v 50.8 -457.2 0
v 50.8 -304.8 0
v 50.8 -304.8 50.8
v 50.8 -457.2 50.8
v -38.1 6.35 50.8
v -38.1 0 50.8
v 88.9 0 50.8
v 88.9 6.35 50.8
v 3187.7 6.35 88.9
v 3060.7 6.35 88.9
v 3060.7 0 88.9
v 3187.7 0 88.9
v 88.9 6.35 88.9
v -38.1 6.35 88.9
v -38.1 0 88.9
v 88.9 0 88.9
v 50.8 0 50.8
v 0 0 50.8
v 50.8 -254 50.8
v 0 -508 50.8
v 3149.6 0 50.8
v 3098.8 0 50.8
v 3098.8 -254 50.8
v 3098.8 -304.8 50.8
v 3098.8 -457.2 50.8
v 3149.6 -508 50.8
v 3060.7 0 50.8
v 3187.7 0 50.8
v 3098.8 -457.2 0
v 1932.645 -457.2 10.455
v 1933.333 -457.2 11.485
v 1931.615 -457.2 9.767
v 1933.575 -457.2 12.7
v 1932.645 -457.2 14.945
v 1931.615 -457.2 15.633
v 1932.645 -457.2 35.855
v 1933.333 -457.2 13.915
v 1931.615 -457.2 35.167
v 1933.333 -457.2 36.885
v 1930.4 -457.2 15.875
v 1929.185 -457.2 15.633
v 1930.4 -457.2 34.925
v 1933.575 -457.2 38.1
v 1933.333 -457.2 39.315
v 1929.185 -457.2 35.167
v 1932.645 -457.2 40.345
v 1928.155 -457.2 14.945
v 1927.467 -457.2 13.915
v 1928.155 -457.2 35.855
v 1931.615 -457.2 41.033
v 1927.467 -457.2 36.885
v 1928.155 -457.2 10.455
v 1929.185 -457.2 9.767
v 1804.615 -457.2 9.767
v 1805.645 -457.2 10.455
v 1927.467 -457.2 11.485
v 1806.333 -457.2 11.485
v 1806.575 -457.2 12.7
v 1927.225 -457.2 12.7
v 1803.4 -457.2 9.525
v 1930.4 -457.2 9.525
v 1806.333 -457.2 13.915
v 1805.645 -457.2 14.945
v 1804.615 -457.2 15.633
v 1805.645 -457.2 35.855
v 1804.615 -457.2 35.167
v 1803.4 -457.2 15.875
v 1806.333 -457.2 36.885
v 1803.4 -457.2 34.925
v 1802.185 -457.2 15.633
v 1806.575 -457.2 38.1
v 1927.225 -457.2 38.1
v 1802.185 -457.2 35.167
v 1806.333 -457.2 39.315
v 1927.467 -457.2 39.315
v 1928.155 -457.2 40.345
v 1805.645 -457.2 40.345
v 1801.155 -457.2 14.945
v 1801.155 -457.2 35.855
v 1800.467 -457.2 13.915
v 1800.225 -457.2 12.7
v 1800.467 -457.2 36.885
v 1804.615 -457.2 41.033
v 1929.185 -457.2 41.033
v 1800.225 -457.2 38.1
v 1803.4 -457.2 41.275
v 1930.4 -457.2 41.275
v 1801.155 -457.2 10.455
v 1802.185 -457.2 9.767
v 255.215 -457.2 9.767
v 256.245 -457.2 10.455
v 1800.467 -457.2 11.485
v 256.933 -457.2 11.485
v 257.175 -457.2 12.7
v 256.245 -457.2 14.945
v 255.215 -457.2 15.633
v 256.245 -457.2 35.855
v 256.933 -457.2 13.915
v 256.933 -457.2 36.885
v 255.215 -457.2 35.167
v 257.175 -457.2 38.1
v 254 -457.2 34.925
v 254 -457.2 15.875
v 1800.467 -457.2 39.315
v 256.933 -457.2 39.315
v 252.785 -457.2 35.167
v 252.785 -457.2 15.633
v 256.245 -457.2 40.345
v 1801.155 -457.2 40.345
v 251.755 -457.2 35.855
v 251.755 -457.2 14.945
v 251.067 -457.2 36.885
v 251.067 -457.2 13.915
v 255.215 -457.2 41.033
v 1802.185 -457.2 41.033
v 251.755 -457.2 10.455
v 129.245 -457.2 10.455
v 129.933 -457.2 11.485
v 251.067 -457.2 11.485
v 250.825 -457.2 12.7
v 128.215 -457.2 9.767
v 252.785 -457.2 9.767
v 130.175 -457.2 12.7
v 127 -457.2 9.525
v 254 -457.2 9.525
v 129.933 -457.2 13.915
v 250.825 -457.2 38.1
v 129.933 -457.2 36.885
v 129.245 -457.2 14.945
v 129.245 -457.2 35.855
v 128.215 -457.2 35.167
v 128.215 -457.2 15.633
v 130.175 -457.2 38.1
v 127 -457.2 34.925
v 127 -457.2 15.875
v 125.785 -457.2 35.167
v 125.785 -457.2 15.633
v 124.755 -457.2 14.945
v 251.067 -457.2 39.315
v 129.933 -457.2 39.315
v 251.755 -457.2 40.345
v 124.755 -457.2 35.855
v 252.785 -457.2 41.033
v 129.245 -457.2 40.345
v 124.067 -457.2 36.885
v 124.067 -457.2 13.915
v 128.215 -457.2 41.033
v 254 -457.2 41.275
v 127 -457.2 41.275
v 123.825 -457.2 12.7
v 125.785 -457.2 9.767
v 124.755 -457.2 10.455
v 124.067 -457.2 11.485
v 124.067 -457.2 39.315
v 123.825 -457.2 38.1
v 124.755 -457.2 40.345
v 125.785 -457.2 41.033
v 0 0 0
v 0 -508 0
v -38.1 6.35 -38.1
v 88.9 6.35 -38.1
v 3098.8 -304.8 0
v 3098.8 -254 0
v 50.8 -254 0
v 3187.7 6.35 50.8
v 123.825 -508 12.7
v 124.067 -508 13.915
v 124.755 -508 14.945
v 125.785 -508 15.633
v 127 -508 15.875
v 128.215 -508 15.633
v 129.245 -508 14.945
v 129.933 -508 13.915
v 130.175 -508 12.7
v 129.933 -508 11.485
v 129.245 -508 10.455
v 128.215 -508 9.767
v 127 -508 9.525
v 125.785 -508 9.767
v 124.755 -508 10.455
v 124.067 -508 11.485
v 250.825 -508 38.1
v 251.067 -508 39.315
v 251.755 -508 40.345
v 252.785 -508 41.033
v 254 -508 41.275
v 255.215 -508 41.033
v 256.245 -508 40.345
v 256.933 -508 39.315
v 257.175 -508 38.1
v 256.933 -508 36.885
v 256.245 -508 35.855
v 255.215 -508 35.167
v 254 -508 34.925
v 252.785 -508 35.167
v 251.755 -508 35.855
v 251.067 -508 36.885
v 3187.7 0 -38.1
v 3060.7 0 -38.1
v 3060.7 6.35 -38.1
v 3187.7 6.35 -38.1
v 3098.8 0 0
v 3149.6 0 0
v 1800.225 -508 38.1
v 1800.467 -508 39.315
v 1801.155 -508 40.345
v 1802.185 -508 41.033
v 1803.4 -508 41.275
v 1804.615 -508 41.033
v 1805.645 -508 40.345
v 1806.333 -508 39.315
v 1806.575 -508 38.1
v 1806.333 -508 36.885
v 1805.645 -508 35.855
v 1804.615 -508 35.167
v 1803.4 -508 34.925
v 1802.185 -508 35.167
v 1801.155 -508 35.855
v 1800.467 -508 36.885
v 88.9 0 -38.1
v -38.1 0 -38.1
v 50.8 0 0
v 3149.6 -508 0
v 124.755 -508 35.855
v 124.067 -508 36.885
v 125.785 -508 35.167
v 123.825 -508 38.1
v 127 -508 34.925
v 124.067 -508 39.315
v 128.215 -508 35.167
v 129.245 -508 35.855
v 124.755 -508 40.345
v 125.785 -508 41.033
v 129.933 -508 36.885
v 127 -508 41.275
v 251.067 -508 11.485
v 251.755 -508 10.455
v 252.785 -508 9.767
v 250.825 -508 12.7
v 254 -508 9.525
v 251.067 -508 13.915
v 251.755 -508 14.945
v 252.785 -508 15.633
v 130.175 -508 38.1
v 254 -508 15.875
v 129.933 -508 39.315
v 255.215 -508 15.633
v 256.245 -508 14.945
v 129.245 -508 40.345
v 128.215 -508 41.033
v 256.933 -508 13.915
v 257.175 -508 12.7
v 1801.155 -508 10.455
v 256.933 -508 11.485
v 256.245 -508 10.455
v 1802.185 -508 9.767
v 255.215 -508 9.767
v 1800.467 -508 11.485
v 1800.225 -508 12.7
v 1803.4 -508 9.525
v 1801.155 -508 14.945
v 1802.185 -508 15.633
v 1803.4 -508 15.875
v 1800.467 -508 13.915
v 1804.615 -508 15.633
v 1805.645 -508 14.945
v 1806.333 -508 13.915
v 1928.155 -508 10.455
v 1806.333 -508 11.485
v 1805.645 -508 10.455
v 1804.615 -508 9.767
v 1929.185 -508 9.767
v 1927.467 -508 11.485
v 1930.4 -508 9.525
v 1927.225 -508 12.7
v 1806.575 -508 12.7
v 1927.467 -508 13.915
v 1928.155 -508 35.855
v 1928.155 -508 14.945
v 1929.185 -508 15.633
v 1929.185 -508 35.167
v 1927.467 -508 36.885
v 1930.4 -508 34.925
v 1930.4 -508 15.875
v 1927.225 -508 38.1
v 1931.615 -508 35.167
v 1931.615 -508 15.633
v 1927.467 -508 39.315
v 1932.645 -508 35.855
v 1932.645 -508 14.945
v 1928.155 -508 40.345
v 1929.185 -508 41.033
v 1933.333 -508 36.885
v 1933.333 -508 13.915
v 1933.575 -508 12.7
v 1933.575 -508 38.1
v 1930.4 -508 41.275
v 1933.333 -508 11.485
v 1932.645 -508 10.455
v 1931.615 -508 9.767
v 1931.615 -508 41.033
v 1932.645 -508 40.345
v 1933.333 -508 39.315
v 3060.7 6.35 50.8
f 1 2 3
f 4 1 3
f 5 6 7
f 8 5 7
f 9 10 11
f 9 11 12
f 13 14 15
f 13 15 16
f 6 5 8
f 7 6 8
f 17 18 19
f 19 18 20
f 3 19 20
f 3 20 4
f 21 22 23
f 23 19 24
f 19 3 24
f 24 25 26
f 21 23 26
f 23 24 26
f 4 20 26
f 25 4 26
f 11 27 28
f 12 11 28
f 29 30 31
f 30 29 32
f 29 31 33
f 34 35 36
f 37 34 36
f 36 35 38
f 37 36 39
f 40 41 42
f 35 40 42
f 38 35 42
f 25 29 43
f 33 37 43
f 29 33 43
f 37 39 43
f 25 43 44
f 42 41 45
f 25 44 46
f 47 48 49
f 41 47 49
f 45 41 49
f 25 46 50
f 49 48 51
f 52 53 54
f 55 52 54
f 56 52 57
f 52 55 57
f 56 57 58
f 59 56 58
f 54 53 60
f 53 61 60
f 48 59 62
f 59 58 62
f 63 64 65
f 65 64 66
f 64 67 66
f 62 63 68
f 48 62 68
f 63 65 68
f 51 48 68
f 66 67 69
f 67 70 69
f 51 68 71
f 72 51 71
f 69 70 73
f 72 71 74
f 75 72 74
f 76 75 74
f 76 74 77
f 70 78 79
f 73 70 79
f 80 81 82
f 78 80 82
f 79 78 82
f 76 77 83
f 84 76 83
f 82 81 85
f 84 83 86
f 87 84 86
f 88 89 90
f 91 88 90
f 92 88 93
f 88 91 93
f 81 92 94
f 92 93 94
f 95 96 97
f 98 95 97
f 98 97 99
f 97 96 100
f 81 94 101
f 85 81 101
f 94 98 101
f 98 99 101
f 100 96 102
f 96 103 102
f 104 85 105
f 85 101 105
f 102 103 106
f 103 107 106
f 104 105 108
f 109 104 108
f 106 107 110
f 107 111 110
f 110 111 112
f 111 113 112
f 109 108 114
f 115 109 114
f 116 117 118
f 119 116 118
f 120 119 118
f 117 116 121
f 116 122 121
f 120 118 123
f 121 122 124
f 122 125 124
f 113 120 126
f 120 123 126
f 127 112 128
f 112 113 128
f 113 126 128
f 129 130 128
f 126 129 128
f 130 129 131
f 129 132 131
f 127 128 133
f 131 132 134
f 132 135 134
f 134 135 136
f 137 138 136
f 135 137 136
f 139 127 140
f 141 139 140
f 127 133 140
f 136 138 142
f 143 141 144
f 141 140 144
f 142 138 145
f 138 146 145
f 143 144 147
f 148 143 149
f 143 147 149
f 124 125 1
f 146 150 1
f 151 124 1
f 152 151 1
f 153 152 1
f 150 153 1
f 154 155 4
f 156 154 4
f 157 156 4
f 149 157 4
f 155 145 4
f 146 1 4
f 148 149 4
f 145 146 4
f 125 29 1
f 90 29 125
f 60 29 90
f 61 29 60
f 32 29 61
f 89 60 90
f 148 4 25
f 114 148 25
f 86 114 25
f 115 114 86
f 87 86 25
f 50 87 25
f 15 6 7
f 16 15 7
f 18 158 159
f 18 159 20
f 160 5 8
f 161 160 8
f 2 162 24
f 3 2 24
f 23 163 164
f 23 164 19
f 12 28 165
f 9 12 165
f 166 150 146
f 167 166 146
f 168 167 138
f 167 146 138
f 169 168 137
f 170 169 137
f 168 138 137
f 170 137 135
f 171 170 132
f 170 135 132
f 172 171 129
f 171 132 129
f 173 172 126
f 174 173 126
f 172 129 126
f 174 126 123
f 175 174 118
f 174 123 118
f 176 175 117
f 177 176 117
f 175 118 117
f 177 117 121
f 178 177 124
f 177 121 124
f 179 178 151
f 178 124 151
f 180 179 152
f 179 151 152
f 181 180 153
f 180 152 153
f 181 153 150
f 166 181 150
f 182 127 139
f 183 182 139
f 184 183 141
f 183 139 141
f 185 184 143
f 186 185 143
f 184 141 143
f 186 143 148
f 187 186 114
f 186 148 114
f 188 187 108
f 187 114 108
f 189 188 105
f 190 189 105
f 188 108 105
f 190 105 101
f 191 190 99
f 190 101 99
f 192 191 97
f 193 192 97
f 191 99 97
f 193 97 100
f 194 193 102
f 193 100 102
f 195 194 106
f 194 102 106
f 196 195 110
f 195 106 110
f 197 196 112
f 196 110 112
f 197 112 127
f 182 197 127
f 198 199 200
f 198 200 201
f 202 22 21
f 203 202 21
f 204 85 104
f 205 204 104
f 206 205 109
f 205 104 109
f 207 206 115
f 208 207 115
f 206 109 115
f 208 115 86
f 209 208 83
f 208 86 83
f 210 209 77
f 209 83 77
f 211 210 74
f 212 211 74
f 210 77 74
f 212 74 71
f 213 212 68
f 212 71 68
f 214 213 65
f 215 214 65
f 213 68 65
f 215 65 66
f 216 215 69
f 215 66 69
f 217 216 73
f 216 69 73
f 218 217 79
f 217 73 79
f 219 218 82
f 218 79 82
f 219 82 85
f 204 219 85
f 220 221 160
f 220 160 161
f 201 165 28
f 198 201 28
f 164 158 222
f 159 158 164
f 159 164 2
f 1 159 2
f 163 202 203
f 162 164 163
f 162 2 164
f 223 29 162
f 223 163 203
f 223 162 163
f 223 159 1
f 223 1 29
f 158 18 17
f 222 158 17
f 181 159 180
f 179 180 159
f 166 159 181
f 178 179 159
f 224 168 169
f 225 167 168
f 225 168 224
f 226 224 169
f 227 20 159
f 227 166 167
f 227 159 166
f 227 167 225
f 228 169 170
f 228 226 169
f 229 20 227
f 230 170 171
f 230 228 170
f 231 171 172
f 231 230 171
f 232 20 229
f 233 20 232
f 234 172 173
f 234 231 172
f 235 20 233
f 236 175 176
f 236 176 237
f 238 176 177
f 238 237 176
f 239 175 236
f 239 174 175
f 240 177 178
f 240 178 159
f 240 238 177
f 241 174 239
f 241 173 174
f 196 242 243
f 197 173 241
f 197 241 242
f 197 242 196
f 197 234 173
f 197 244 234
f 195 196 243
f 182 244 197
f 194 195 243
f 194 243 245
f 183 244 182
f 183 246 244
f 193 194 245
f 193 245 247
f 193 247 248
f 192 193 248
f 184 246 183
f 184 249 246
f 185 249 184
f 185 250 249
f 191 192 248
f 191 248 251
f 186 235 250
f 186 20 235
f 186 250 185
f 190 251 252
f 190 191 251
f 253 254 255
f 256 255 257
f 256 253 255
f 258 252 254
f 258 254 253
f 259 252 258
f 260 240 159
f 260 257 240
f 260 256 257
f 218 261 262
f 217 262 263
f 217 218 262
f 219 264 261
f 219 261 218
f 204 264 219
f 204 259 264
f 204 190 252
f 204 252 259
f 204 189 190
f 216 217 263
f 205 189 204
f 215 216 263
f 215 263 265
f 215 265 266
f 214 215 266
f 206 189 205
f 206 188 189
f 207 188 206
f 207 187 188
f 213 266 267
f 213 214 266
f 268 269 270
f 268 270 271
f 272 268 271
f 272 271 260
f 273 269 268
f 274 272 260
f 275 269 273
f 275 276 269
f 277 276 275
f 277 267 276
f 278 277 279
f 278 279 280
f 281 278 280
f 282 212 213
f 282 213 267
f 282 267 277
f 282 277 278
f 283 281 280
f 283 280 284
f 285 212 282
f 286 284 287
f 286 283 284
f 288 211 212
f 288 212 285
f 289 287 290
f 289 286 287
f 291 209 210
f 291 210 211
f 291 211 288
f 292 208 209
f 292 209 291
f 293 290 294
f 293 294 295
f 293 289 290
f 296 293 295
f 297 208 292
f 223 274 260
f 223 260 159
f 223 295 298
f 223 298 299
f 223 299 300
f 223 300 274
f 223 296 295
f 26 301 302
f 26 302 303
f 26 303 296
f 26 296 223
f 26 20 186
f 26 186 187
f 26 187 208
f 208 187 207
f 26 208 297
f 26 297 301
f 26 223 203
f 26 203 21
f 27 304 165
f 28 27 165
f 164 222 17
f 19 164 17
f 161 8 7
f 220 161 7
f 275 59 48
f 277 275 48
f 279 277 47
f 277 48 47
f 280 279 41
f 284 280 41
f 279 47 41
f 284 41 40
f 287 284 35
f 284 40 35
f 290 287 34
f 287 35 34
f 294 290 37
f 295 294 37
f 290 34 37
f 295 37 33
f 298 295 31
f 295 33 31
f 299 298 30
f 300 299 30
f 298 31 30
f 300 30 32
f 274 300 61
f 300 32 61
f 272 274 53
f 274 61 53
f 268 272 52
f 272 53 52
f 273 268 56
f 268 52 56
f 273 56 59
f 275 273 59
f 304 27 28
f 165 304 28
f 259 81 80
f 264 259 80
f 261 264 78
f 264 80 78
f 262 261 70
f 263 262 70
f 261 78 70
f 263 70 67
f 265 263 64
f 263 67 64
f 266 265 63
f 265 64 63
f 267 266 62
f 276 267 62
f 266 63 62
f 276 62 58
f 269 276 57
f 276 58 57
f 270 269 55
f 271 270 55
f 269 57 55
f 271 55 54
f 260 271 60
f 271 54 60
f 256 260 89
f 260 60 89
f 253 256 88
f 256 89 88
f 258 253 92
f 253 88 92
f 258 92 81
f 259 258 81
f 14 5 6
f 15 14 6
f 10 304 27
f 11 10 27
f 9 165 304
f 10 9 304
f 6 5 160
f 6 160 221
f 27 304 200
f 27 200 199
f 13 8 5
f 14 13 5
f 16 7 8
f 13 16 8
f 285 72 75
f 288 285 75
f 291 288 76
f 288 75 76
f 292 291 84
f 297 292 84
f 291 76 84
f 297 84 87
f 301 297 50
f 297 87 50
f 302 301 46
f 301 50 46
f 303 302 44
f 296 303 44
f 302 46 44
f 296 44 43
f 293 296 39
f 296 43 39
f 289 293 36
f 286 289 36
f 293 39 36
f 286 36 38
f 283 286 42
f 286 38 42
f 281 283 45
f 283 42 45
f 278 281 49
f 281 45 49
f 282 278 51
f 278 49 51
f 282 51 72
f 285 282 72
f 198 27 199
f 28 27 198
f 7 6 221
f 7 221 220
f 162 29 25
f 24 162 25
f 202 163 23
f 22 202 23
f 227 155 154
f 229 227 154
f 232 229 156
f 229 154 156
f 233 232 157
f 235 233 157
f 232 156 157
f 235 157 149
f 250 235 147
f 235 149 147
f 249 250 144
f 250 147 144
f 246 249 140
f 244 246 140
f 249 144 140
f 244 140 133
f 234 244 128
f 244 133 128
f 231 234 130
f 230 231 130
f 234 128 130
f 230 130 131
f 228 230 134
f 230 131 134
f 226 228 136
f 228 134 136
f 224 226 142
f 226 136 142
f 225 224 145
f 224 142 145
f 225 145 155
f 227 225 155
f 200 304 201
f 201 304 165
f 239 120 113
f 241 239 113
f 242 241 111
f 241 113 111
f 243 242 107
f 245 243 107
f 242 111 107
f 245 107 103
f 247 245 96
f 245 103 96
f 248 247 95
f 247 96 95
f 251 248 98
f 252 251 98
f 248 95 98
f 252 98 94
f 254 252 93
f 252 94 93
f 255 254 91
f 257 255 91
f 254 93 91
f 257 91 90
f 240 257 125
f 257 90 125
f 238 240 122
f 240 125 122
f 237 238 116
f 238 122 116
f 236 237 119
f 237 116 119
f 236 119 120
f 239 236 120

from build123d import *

# Parameters (mm, degrees)
F0_W      = 50.8
F0_H      = 50.8
F1_DEPTH  = 508
F2_W      = 50.8
F2_H      = 50.8
F3_DEPTH  = 3048
F4_W      = 50.8
F4_H      = 50.8
F5_DEPTH  = 508
F7_DEPTH  = 38.1
F7_FACE_W = 127
F7_FACE_H = 6.35
F8_DEPTH  = 88.9
F10_D     = 6.35
F10_DEPTH = 50.8


with BuildPart() as f1:
    # F0 (on Front) → F1 (new body)
    with BuildSketch(Plane.XZ):
        with Locations((25.4, 25.4)):
            Rectangle(F0_W, F0_H)
    extrude(amount=F1_DEPTH)

    # F2 (on face) → F3 (join)
    with BuildSketch(Plane.YZ.offset(50.8)):
        with Locations((-482.6, 25.4)):
            Rectangle(F2_W, F2_H)
        with Locations((-279.4, 25.4)):
            Rectangle(F2_W, F2_H)
    extrude(amount=F3_DEPTH)

    # F4 (on face) → F5 (join)
    with BuildSketch(Plane.XZ.offset(508)):
        with Locations((3124.2, 25.4)):
            Rectangle(F4_W, F4_H)
    extrude(amount=-F5_DEPTH)

    # F10
    with Locations(Plane.XZ.offset(508)):
        with Locations((127, 38.1), (254, 38.1), (127, 12.7), (254, 12.7), (1803.4, 38.1), (1803.4, 12.7), (1930.4, 38.1), (1930.4, 12.7)):
            Hole(F10_D / 2, depth=F10_DEPTH)


with BuildPart() as f7:
    # F6 (on face) → F7 (new body)
    with BuildSketch(Plane.XY.offset(50.8)):
        Polygon((3098.8, 0), (3149.6, 0), (3187.7, 0), (3187.7, 6.35), (3060.7, 6.35), (3060.7, 0), align=None)
        Polygon((-38.1, 6.35), (-38.1, 0), (0, 0), (50.8, 0), (88.9, 0), (88.9, 6.35), align=None)
    extrude(amount=F7_DEPTH)


with BuildPart() as f8:
    # F7_face (on face) → F8 (new body)
    with BuildSketch(Plane(origin=(25.4, 3.175, 50.8), x_dir=(1, 0, 0), z_dir=(0, 0, -1))):
        Rectangle(F7_FACE_W, F7_FACE_H)
        with Locations((3098.8, 0)):
            Rectangle(F7_FACE_W, F7_FACE_H)
    extrude(amount=F8_DEPTH)


solid = Compound([f1.part, f7.part, f8.part])
